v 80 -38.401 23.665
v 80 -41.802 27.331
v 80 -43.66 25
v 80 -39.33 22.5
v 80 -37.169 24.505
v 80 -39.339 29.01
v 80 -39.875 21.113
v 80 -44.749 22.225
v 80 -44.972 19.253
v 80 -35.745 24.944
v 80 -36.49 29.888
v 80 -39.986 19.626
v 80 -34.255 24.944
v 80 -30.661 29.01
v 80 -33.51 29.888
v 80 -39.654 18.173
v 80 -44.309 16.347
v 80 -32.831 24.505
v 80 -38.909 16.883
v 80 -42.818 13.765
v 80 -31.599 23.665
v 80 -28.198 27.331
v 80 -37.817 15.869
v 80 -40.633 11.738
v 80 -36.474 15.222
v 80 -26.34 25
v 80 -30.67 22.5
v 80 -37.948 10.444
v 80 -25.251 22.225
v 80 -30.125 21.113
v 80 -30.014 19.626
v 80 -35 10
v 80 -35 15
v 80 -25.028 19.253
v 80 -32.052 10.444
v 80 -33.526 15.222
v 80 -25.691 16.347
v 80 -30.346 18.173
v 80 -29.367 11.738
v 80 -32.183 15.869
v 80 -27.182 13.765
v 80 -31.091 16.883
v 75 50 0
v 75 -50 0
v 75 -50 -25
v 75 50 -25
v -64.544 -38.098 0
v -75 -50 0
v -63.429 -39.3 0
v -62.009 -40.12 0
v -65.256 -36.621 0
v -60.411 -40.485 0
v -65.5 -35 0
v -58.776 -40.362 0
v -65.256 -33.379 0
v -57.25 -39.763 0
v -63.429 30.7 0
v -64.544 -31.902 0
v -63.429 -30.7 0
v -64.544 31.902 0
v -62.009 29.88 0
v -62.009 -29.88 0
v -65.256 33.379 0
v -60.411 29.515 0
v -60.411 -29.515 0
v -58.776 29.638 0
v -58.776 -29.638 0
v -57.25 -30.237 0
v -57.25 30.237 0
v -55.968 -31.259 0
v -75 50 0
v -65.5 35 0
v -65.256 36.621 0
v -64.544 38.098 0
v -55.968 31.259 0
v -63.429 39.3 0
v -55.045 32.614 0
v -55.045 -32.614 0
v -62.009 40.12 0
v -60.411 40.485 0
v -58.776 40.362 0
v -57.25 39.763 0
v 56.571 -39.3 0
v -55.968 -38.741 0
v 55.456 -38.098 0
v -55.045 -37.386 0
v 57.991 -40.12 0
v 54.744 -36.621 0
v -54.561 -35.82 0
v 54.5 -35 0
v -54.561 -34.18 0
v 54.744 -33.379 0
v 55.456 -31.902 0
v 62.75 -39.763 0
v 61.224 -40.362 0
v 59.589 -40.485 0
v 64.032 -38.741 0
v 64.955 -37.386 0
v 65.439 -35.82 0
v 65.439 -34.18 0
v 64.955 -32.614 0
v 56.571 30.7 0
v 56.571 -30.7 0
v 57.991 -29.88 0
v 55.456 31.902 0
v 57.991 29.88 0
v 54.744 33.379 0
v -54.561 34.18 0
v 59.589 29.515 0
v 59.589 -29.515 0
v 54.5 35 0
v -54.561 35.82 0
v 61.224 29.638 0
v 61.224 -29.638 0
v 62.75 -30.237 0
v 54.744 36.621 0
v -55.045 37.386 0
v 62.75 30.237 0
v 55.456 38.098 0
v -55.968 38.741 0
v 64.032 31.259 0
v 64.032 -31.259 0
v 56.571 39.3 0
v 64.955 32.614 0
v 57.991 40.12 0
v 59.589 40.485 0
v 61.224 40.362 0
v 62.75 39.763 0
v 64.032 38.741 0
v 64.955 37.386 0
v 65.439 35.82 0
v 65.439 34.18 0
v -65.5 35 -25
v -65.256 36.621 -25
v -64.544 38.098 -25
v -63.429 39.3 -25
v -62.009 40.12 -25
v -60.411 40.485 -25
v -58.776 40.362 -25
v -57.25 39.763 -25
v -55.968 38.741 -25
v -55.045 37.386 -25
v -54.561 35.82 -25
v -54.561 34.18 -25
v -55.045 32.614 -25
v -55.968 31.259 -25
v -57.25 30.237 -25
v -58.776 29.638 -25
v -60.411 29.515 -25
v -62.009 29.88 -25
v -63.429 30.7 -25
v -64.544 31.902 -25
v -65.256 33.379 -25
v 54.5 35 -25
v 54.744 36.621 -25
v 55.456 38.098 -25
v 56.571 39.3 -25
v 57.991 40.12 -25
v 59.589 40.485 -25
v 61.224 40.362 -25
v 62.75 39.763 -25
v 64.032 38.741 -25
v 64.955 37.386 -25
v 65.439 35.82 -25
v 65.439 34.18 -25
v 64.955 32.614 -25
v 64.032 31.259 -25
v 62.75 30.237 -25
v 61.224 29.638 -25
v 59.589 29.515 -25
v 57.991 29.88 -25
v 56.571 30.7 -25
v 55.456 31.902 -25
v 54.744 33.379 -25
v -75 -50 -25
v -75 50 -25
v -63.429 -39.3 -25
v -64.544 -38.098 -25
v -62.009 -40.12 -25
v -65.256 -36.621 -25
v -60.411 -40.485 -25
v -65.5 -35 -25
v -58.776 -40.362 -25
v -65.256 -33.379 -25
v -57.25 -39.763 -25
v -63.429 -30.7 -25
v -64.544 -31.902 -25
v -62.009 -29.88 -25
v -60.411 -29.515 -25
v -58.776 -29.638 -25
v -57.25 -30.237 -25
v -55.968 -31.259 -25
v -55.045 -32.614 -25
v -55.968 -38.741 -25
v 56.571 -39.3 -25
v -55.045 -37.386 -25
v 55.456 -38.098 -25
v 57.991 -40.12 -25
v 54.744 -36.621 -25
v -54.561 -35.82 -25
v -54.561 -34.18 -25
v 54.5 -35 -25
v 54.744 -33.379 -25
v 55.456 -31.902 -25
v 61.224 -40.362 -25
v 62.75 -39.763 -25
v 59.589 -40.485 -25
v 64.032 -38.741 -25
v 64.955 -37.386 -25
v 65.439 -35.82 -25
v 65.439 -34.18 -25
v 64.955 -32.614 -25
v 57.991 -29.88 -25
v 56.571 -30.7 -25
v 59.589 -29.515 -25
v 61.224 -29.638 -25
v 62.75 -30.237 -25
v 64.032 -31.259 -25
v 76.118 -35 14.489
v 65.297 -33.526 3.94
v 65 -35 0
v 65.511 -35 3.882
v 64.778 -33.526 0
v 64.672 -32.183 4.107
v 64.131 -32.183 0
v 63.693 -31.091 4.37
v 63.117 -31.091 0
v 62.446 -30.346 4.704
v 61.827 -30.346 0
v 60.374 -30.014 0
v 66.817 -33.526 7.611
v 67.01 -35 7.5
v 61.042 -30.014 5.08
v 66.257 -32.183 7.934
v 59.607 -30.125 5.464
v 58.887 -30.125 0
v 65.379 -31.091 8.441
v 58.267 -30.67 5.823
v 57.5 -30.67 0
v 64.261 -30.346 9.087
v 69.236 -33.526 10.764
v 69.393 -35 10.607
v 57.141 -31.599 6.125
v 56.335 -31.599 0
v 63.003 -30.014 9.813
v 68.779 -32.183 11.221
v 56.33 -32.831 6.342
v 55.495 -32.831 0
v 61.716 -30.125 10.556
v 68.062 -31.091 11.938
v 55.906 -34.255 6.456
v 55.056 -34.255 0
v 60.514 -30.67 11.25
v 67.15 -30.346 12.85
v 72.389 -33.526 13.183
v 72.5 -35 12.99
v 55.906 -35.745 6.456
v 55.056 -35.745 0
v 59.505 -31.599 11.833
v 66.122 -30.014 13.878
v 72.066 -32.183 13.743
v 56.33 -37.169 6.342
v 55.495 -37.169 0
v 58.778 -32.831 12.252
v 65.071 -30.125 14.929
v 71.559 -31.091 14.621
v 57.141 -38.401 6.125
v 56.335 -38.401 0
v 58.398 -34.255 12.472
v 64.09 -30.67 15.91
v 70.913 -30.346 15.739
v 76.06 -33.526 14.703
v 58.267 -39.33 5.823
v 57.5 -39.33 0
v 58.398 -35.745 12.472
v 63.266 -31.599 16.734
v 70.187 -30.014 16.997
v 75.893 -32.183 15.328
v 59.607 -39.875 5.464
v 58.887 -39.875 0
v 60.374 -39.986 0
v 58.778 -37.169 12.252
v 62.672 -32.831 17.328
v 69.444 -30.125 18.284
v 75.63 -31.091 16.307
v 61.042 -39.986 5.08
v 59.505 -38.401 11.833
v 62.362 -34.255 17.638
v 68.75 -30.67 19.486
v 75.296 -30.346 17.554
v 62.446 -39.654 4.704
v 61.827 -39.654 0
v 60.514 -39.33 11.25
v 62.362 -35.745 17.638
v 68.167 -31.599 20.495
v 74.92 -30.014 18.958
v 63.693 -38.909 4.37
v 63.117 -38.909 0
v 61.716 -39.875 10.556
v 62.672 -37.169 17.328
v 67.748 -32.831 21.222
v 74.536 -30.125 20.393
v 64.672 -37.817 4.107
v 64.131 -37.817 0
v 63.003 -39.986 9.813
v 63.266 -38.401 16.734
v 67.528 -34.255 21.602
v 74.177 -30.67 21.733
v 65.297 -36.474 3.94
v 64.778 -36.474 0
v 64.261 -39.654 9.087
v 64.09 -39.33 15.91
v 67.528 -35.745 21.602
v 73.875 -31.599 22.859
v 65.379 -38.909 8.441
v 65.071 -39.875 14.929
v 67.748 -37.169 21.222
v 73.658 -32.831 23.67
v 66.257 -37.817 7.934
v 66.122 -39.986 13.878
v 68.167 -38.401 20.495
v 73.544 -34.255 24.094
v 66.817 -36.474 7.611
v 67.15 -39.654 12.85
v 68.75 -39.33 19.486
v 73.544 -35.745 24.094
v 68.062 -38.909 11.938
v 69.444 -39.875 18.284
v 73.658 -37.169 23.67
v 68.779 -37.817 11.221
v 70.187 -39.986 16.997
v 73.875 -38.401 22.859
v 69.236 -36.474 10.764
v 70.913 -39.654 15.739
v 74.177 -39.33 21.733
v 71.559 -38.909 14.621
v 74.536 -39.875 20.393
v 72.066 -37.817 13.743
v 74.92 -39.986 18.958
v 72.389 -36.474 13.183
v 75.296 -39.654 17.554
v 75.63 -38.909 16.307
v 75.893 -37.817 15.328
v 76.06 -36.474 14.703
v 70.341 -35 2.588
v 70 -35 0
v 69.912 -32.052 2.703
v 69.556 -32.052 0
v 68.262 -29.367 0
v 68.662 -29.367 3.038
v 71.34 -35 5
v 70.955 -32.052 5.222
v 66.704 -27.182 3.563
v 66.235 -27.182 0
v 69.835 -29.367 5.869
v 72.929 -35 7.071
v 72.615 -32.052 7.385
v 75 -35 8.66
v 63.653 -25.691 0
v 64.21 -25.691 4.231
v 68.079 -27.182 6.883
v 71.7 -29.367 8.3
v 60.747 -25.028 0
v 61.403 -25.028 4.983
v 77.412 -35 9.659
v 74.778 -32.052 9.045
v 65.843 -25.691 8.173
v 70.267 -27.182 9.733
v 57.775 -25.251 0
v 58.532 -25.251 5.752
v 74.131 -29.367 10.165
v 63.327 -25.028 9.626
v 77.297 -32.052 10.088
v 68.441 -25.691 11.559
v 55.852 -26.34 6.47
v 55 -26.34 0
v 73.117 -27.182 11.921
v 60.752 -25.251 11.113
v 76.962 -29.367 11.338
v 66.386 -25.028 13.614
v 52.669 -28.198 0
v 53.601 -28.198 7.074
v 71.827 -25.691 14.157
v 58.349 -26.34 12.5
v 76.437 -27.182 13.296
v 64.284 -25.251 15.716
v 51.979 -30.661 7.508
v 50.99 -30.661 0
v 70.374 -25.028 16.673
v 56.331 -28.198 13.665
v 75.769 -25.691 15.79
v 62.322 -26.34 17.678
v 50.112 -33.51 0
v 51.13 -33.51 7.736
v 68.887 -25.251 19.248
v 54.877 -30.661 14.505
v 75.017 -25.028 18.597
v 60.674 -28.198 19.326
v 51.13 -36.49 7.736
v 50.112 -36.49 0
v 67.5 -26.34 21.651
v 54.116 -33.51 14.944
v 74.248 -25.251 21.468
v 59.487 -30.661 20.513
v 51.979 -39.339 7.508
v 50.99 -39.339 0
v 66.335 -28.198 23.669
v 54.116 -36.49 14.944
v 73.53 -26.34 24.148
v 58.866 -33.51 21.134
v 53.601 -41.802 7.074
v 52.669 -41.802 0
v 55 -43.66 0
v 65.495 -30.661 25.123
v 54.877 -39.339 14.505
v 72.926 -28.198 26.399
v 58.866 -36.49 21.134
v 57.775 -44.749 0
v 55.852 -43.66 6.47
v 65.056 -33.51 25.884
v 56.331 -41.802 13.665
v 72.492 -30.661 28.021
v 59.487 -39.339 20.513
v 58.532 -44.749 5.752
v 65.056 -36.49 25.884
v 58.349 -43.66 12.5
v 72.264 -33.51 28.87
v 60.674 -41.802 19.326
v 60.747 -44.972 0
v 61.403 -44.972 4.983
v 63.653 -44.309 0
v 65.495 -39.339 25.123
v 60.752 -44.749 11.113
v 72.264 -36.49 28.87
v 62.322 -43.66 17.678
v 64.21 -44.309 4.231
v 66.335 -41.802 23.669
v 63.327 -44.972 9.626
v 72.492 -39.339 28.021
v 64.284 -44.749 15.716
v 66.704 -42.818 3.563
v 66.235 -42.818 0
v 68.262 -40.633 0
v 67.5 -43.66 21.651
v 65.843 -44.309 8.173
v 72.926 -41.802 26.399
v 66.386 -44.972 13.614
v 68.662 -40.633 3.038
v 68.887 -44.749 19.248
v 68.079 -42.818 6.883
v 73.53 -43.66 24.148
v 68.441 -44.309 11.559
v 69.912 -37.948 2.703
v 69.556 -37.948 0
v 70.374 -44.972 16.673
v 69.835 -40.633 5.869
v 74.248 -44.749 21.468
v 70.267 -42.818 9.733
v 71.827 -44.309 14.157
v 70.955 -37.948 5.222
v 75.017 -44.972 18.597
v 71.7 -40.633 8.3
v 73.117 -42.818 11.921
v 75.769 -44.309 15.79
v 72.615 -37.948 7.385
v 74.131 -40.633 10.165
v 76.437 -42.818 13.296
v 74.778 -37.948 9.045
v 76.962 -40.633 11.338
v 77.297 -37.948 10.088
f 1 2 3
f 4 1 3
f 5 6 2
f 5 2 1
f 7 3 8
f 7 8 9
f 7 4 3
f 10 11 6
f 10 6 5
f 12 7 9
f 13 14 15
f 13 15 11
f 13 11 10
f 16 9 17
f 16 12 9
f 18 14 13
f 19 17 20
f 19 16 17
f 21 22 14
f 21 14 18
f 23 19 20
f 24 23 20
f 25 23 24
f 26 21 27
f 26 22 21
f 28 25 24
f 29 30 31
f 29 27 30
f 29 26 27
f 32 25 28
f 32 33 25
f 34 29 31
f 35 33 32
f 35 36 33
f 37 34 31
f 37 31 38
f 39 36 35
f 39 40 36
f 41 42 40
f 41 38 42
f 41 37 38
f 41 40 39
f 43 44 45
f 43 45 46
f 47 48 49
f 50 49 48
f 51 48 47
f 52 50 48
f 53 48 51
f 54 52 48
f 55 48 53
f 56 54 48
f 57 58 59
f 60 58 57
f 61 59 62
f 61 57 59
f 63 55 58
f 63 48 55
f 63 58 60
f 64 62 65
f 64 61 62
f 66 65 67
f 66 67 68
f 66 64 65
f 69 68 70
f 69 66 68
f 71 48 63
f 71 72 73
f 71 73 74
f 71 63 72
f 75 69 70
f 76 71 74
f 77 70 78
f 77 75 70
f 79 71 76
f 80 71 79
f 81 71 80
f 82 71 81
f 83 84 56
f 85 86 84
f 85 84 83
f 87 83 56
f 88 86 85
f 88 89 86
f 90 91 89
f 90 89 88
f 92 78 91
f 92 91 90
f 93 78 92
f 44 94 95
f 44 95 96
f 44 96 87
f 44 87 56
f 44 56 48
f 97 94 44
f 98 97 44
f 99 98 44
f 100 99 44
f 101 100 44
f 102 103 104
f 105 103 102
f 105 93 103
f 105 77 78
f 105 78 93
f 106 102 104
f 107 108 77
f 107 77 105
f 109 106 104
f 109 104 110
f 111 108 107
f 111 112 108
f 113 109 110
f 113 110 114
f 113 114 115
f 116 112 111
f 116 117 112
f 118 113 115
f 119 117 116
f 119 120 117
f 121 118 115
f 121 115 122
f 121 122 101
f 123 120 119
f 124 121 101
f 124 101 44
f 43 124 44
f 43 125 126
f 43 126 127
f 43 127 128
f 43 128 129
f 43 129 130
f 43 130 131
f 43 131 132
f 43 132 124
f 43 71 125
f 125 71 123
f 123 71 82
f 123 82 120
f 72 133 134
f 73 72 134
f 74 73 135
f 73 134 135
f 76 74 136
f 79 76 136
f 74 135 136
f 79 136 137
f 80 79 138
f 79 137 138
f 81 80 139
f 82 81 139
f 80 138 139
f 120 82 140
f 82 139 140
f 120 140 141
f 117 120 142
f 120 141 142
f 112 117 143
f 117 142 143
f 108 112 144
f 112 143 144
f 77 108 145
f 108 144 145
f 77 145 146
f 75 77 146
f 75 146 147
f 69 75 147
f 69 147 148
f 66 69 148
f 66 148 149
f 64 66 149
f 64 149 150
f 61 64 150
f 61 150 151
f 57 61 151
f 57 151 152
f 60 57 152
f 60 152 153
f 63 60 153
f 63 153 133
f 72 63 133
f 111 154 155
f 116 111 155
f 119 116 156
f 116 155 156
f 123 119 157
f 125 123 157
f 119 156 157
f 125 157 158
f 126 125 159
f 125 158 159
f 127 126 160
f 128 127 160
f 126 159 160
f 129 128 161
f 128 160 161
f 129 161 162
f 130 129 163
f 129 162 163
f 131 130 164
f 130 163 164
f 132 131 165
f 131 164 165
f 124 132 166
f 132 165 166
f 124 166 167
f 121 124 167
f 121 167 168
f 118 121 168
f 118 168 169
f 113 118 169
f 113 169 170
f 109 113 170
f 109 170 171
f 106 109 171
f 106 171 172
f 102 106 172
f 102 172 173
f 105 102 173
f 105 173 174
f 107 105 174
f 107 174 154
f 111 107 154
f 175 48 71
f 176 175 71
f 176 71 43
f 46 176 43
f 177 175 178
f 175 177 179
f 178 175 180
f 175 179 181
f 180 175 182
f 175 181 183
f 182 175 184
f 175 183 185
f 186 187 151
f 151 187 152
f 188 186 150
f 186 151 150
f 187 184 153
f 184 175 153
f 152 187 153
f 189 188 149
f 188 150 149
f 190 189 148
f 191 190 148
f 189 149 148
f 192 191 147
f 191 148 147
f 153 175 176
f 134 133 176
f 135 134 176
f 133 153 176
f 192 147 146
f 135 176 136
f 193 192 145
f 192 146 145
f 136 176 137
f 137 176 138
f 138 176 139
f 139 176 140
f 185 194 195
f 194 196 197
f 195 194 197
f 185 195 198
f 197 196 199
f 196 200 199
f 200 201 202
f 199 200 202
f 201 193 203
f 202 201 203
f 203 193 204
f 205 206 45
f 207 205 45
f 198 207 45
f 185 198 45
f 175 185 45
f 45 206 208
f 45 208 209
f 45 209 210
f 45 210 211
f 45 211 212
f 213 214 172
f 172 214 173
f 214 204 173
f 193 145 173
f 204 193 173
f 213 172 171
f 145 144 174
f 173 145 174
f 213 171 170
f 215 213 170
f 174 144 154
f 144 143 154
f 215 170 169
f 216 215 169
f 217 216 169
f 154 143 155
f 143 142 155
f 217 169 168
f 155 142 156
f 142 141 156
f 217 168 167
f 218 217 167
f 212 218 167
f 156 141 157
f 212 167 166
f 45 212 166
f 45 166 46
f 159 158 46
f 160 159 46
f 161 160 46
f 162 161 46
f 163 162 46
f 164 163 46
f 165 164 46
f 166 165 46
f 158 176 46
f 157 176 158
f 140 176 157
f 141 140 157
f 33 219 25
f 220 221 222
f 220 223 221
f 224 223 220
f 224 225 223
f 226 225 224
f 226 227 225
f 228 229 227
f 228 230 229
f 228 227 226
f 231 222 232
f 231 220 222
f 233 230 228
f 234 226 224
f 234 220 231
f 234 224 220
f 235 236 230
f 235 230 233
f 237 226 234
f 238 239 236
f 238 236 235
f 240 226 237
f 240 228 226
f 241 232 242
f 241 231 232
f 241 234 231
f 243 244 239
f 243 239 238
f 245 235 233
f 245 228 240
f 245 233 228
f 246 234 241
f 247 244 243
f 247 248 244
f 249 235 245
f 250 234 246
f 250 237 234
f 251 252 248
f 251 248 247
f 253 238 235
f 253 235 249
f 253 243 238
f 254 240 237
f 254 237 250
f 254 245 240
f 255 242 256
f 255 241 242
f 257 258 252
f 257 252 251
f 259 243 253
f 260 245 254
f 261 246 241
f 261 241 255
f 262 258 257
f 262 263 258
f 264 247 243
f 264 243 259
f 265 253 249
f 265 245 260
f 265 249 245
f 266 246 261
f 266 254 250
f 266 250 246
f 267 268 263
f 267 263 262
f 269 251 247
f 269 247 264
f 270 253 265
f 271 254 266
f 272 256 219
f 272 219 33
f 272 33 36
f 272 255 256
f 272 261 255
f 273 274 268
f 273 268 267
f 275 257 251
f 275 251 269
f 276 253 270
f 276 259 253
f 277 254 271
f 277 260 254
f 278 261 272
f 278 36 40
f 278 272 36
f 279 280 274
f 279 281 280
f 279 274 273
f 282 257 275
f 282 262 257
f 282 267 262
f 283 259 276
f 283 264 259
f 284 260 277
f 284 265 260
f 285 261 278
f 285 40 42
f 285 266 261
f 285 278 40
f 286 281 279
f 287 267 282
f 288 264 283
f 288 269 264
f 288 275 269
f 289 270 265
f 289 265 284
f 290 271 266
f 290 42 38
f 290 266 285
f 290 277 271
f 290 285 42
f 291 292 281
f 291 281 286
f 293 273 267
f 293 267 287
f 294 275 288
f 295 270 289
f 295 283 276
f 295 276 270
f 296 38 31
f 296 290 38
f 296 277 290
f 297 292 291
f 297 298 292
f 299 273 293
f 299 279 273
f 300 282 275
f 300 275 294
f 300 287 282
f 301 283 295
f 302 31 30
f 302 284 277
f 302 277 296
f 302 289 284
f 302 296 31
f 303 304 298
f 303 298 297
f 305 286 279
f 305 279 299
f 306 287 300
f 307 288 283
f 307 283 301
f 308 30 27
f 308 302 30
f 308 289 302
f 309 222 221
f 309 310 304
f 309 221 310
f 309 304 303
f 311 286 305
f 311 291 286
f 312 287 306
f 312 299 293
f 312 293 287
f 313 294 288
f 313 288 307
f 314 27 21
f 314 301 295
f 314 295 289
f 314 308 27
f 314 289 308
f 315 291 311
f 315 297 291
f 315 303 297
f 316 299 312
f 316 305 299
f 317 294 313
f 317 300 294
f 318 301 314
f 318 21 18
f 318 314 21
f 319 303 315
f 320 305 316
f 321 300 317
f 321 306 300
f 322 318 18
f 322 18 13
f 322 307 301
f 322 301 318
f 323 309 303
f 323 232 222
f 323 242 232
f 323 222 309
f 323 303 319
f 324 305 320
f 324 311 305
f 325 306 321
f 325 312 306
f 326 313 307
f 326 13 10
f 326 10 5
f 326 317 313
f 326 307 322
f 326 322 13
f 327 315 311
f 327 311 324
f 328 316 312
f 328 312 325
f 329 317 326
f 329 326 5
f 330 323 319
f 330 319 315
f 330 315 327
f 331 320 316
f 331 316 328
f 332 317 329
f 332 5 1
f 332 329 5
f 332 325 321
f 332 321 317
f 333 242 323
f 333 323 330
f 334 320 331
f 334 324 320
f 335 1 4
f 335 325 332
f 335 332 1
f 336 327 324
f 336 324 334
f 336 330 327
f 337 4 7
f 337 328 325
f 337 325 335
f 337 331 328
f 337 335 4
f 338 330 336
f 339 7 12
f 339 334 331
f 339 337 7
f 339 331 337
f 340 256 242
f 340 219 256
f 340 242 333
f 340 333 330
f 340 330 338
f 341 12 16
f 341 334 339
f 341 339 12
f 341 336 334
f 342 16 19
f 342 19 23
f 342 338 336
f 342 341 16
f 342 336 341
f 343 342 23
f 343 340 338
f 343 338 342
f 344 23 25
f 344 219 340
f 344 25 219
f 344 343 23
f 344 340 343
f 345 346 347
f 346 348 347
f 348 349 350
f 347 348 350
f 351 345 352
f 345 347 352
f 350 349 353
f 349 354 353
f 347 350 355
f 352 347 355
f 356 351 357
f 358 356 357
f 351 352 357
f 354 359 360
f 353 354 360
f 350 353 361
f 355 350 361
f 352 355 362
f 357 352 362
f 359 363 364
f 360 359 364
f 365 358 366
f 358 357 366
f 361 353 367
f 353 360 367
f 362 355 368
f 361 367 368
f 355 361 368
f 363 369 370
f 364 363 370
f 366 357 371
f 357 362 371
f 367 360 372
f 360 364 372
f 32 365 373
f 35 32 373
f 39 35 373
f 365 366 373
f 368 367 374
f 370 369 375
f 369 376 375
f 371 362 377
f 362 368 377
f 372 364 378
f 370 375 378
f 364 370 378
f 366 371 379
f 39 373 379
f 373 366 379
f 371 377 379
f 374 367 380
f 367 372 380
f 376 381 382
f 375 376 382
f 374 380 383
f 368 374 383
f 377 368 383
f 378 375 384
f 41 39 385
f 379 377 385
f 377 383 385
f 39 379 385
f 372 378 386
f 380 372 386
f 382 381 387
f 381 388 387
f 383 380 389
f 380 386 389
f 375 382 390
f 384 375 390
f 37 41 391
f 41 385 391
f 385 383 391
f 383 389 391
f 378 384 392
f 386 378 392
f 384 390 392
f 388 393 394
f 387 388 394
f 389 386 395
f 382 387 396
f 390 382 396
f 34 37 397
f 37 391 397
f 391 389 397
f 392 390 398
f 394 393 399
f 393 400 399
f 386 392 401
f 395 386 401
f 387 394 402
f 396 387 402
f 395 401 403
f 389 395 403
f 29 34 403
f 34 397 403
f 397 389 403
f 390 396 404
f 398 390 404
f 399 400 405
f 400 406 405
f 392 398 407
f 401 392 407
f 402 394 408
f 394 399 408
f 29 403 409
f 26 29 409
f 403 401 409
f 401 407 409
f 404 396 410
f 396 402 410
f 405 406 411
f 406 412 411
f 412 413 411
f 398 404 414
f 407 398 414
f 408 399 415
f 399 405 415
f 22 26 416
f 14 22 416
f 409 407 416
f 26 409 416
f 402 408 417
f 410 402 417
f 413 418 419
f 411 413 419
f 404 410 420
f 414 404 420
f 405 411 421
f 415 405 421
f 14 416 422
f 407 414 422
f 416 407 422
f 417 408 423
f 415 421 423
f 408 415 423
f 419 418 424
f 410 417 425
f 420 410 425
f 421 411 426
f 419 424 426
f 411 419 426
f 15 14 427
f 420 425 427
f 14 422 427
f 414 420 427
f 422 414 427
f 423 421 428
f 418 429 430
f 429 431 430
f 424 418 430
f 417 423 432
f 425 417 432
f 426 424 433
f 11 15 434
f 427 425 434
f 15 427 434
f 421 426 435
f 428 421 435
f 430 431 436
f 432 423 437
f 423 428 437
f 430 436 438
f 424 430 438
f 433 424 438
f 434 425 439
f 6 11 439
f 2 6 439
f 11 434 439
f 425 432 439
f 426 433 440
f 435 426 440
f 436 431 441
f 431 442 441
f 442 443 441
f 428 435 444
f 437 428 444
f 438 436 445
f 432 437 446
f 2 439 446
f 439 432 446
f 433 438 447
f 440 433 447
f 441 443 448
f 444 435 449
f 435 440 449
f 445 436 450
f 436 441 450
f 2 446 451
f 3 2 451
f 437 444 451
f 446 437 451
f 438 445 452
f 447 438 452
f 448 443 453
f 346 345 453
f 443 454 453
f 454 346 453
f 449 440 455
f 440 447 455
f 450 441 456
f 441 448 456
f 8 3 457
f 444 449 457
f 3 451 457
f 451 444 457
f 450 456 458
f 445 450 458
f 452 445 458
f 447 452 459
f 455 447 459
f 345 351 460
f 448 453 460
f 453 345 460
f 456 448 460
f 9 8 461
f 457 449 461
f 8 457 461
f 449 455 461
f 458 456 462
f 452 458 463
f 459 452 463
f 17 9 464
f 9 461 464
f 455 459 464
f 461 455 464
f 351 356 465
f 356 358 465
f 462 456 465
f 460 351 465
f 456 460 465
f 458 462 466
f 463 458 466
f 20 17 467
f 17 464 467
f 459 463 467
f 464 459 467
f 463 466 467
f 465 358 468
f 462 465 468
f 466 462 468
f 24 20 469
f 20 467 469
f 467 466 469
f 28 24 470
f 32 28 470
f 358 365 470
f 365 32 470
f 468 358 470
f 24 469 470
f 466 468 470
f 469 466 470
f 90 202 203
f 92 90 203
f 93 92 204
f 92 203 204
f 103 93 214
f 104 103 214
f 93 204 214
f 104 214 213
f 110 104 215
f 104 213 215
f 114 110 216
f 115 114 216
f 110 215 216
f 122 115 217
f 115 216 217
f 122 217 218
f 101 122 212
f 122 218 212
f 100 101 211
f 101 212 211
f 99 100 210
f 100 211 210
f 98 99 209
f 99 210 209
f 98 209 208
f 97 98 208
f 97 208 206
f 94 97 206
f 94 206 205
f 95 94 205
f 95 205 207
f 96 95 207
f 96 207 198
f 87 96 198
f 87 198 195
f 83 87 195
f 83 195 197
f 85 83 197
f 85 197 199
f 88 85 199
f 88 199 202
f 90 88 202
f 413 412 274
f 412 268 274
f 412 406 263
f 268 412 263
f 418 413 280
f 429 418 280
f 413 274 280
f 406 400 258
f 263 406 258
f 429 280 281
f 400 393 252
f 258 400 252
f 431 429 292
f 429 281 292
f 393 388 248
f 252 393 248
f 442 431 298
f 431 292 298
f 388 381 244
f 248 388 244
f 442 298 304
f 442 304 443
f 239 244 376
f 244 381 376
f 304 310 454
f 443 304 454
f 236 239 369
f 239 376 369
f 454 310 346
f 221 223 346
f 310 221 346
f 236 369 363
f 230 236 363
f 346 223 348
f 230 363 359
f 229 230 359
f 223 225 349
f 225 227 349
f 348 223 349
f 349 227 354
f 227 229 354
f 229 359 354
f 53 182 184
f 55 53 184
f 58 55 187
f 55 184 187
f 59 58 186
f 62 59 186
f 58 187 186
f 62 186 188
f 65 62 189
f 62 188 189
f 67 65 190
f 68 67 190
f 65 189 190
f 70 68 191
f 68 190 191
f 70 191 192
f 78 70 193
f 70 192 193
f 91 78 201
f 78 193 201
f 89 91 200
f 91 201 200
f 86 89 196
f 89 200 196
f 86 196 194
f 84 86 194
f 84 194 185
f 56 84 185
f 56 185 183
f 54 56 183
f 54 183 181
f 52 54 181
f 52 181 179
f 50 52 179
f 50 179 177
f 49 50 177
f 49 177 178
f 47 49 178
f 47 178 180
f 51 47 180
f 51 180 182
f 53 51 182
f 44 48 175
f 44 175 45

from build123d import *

# Parameters (mm, degrees)
F0_W     = 150
F0_H     = 100
F1_DEPTH = 25
F2_D     = 11
F3_R     = 10
F3_R_2   = 5
F4_ANGLE = 90


with BuildPart() as f1:
    # F0 (on Top) → F1 (new body)
    with BuildSketch(Plane.XY):
        Rectangle(F0_W, F0_H)
    extrude(amount=-F1_DEPTH)

    # F2 (through all)
    with Locations(Plane.XY):
        with Locations((-60, -35), (60, -35), (60, 35), (-60, 35)):
            Hole(F2_D / 2)


with BuildPart() as f4:
    # F3 (on face) → F4 (revolve)
    with BuildSketch(Plane.XY):
        with Locations((60, -35)):
            Circle(F3_R)
        with Locations((60, -35)):
            Circle(F3_R_2, mode=Mode.SUBTRACT)
    revolve(axis=Axis((80, -35.077563487, 0), (0, 1, 0)), revolution_arc=F4_ANGLE)


solid = Compound([f1.part, f4.part])
